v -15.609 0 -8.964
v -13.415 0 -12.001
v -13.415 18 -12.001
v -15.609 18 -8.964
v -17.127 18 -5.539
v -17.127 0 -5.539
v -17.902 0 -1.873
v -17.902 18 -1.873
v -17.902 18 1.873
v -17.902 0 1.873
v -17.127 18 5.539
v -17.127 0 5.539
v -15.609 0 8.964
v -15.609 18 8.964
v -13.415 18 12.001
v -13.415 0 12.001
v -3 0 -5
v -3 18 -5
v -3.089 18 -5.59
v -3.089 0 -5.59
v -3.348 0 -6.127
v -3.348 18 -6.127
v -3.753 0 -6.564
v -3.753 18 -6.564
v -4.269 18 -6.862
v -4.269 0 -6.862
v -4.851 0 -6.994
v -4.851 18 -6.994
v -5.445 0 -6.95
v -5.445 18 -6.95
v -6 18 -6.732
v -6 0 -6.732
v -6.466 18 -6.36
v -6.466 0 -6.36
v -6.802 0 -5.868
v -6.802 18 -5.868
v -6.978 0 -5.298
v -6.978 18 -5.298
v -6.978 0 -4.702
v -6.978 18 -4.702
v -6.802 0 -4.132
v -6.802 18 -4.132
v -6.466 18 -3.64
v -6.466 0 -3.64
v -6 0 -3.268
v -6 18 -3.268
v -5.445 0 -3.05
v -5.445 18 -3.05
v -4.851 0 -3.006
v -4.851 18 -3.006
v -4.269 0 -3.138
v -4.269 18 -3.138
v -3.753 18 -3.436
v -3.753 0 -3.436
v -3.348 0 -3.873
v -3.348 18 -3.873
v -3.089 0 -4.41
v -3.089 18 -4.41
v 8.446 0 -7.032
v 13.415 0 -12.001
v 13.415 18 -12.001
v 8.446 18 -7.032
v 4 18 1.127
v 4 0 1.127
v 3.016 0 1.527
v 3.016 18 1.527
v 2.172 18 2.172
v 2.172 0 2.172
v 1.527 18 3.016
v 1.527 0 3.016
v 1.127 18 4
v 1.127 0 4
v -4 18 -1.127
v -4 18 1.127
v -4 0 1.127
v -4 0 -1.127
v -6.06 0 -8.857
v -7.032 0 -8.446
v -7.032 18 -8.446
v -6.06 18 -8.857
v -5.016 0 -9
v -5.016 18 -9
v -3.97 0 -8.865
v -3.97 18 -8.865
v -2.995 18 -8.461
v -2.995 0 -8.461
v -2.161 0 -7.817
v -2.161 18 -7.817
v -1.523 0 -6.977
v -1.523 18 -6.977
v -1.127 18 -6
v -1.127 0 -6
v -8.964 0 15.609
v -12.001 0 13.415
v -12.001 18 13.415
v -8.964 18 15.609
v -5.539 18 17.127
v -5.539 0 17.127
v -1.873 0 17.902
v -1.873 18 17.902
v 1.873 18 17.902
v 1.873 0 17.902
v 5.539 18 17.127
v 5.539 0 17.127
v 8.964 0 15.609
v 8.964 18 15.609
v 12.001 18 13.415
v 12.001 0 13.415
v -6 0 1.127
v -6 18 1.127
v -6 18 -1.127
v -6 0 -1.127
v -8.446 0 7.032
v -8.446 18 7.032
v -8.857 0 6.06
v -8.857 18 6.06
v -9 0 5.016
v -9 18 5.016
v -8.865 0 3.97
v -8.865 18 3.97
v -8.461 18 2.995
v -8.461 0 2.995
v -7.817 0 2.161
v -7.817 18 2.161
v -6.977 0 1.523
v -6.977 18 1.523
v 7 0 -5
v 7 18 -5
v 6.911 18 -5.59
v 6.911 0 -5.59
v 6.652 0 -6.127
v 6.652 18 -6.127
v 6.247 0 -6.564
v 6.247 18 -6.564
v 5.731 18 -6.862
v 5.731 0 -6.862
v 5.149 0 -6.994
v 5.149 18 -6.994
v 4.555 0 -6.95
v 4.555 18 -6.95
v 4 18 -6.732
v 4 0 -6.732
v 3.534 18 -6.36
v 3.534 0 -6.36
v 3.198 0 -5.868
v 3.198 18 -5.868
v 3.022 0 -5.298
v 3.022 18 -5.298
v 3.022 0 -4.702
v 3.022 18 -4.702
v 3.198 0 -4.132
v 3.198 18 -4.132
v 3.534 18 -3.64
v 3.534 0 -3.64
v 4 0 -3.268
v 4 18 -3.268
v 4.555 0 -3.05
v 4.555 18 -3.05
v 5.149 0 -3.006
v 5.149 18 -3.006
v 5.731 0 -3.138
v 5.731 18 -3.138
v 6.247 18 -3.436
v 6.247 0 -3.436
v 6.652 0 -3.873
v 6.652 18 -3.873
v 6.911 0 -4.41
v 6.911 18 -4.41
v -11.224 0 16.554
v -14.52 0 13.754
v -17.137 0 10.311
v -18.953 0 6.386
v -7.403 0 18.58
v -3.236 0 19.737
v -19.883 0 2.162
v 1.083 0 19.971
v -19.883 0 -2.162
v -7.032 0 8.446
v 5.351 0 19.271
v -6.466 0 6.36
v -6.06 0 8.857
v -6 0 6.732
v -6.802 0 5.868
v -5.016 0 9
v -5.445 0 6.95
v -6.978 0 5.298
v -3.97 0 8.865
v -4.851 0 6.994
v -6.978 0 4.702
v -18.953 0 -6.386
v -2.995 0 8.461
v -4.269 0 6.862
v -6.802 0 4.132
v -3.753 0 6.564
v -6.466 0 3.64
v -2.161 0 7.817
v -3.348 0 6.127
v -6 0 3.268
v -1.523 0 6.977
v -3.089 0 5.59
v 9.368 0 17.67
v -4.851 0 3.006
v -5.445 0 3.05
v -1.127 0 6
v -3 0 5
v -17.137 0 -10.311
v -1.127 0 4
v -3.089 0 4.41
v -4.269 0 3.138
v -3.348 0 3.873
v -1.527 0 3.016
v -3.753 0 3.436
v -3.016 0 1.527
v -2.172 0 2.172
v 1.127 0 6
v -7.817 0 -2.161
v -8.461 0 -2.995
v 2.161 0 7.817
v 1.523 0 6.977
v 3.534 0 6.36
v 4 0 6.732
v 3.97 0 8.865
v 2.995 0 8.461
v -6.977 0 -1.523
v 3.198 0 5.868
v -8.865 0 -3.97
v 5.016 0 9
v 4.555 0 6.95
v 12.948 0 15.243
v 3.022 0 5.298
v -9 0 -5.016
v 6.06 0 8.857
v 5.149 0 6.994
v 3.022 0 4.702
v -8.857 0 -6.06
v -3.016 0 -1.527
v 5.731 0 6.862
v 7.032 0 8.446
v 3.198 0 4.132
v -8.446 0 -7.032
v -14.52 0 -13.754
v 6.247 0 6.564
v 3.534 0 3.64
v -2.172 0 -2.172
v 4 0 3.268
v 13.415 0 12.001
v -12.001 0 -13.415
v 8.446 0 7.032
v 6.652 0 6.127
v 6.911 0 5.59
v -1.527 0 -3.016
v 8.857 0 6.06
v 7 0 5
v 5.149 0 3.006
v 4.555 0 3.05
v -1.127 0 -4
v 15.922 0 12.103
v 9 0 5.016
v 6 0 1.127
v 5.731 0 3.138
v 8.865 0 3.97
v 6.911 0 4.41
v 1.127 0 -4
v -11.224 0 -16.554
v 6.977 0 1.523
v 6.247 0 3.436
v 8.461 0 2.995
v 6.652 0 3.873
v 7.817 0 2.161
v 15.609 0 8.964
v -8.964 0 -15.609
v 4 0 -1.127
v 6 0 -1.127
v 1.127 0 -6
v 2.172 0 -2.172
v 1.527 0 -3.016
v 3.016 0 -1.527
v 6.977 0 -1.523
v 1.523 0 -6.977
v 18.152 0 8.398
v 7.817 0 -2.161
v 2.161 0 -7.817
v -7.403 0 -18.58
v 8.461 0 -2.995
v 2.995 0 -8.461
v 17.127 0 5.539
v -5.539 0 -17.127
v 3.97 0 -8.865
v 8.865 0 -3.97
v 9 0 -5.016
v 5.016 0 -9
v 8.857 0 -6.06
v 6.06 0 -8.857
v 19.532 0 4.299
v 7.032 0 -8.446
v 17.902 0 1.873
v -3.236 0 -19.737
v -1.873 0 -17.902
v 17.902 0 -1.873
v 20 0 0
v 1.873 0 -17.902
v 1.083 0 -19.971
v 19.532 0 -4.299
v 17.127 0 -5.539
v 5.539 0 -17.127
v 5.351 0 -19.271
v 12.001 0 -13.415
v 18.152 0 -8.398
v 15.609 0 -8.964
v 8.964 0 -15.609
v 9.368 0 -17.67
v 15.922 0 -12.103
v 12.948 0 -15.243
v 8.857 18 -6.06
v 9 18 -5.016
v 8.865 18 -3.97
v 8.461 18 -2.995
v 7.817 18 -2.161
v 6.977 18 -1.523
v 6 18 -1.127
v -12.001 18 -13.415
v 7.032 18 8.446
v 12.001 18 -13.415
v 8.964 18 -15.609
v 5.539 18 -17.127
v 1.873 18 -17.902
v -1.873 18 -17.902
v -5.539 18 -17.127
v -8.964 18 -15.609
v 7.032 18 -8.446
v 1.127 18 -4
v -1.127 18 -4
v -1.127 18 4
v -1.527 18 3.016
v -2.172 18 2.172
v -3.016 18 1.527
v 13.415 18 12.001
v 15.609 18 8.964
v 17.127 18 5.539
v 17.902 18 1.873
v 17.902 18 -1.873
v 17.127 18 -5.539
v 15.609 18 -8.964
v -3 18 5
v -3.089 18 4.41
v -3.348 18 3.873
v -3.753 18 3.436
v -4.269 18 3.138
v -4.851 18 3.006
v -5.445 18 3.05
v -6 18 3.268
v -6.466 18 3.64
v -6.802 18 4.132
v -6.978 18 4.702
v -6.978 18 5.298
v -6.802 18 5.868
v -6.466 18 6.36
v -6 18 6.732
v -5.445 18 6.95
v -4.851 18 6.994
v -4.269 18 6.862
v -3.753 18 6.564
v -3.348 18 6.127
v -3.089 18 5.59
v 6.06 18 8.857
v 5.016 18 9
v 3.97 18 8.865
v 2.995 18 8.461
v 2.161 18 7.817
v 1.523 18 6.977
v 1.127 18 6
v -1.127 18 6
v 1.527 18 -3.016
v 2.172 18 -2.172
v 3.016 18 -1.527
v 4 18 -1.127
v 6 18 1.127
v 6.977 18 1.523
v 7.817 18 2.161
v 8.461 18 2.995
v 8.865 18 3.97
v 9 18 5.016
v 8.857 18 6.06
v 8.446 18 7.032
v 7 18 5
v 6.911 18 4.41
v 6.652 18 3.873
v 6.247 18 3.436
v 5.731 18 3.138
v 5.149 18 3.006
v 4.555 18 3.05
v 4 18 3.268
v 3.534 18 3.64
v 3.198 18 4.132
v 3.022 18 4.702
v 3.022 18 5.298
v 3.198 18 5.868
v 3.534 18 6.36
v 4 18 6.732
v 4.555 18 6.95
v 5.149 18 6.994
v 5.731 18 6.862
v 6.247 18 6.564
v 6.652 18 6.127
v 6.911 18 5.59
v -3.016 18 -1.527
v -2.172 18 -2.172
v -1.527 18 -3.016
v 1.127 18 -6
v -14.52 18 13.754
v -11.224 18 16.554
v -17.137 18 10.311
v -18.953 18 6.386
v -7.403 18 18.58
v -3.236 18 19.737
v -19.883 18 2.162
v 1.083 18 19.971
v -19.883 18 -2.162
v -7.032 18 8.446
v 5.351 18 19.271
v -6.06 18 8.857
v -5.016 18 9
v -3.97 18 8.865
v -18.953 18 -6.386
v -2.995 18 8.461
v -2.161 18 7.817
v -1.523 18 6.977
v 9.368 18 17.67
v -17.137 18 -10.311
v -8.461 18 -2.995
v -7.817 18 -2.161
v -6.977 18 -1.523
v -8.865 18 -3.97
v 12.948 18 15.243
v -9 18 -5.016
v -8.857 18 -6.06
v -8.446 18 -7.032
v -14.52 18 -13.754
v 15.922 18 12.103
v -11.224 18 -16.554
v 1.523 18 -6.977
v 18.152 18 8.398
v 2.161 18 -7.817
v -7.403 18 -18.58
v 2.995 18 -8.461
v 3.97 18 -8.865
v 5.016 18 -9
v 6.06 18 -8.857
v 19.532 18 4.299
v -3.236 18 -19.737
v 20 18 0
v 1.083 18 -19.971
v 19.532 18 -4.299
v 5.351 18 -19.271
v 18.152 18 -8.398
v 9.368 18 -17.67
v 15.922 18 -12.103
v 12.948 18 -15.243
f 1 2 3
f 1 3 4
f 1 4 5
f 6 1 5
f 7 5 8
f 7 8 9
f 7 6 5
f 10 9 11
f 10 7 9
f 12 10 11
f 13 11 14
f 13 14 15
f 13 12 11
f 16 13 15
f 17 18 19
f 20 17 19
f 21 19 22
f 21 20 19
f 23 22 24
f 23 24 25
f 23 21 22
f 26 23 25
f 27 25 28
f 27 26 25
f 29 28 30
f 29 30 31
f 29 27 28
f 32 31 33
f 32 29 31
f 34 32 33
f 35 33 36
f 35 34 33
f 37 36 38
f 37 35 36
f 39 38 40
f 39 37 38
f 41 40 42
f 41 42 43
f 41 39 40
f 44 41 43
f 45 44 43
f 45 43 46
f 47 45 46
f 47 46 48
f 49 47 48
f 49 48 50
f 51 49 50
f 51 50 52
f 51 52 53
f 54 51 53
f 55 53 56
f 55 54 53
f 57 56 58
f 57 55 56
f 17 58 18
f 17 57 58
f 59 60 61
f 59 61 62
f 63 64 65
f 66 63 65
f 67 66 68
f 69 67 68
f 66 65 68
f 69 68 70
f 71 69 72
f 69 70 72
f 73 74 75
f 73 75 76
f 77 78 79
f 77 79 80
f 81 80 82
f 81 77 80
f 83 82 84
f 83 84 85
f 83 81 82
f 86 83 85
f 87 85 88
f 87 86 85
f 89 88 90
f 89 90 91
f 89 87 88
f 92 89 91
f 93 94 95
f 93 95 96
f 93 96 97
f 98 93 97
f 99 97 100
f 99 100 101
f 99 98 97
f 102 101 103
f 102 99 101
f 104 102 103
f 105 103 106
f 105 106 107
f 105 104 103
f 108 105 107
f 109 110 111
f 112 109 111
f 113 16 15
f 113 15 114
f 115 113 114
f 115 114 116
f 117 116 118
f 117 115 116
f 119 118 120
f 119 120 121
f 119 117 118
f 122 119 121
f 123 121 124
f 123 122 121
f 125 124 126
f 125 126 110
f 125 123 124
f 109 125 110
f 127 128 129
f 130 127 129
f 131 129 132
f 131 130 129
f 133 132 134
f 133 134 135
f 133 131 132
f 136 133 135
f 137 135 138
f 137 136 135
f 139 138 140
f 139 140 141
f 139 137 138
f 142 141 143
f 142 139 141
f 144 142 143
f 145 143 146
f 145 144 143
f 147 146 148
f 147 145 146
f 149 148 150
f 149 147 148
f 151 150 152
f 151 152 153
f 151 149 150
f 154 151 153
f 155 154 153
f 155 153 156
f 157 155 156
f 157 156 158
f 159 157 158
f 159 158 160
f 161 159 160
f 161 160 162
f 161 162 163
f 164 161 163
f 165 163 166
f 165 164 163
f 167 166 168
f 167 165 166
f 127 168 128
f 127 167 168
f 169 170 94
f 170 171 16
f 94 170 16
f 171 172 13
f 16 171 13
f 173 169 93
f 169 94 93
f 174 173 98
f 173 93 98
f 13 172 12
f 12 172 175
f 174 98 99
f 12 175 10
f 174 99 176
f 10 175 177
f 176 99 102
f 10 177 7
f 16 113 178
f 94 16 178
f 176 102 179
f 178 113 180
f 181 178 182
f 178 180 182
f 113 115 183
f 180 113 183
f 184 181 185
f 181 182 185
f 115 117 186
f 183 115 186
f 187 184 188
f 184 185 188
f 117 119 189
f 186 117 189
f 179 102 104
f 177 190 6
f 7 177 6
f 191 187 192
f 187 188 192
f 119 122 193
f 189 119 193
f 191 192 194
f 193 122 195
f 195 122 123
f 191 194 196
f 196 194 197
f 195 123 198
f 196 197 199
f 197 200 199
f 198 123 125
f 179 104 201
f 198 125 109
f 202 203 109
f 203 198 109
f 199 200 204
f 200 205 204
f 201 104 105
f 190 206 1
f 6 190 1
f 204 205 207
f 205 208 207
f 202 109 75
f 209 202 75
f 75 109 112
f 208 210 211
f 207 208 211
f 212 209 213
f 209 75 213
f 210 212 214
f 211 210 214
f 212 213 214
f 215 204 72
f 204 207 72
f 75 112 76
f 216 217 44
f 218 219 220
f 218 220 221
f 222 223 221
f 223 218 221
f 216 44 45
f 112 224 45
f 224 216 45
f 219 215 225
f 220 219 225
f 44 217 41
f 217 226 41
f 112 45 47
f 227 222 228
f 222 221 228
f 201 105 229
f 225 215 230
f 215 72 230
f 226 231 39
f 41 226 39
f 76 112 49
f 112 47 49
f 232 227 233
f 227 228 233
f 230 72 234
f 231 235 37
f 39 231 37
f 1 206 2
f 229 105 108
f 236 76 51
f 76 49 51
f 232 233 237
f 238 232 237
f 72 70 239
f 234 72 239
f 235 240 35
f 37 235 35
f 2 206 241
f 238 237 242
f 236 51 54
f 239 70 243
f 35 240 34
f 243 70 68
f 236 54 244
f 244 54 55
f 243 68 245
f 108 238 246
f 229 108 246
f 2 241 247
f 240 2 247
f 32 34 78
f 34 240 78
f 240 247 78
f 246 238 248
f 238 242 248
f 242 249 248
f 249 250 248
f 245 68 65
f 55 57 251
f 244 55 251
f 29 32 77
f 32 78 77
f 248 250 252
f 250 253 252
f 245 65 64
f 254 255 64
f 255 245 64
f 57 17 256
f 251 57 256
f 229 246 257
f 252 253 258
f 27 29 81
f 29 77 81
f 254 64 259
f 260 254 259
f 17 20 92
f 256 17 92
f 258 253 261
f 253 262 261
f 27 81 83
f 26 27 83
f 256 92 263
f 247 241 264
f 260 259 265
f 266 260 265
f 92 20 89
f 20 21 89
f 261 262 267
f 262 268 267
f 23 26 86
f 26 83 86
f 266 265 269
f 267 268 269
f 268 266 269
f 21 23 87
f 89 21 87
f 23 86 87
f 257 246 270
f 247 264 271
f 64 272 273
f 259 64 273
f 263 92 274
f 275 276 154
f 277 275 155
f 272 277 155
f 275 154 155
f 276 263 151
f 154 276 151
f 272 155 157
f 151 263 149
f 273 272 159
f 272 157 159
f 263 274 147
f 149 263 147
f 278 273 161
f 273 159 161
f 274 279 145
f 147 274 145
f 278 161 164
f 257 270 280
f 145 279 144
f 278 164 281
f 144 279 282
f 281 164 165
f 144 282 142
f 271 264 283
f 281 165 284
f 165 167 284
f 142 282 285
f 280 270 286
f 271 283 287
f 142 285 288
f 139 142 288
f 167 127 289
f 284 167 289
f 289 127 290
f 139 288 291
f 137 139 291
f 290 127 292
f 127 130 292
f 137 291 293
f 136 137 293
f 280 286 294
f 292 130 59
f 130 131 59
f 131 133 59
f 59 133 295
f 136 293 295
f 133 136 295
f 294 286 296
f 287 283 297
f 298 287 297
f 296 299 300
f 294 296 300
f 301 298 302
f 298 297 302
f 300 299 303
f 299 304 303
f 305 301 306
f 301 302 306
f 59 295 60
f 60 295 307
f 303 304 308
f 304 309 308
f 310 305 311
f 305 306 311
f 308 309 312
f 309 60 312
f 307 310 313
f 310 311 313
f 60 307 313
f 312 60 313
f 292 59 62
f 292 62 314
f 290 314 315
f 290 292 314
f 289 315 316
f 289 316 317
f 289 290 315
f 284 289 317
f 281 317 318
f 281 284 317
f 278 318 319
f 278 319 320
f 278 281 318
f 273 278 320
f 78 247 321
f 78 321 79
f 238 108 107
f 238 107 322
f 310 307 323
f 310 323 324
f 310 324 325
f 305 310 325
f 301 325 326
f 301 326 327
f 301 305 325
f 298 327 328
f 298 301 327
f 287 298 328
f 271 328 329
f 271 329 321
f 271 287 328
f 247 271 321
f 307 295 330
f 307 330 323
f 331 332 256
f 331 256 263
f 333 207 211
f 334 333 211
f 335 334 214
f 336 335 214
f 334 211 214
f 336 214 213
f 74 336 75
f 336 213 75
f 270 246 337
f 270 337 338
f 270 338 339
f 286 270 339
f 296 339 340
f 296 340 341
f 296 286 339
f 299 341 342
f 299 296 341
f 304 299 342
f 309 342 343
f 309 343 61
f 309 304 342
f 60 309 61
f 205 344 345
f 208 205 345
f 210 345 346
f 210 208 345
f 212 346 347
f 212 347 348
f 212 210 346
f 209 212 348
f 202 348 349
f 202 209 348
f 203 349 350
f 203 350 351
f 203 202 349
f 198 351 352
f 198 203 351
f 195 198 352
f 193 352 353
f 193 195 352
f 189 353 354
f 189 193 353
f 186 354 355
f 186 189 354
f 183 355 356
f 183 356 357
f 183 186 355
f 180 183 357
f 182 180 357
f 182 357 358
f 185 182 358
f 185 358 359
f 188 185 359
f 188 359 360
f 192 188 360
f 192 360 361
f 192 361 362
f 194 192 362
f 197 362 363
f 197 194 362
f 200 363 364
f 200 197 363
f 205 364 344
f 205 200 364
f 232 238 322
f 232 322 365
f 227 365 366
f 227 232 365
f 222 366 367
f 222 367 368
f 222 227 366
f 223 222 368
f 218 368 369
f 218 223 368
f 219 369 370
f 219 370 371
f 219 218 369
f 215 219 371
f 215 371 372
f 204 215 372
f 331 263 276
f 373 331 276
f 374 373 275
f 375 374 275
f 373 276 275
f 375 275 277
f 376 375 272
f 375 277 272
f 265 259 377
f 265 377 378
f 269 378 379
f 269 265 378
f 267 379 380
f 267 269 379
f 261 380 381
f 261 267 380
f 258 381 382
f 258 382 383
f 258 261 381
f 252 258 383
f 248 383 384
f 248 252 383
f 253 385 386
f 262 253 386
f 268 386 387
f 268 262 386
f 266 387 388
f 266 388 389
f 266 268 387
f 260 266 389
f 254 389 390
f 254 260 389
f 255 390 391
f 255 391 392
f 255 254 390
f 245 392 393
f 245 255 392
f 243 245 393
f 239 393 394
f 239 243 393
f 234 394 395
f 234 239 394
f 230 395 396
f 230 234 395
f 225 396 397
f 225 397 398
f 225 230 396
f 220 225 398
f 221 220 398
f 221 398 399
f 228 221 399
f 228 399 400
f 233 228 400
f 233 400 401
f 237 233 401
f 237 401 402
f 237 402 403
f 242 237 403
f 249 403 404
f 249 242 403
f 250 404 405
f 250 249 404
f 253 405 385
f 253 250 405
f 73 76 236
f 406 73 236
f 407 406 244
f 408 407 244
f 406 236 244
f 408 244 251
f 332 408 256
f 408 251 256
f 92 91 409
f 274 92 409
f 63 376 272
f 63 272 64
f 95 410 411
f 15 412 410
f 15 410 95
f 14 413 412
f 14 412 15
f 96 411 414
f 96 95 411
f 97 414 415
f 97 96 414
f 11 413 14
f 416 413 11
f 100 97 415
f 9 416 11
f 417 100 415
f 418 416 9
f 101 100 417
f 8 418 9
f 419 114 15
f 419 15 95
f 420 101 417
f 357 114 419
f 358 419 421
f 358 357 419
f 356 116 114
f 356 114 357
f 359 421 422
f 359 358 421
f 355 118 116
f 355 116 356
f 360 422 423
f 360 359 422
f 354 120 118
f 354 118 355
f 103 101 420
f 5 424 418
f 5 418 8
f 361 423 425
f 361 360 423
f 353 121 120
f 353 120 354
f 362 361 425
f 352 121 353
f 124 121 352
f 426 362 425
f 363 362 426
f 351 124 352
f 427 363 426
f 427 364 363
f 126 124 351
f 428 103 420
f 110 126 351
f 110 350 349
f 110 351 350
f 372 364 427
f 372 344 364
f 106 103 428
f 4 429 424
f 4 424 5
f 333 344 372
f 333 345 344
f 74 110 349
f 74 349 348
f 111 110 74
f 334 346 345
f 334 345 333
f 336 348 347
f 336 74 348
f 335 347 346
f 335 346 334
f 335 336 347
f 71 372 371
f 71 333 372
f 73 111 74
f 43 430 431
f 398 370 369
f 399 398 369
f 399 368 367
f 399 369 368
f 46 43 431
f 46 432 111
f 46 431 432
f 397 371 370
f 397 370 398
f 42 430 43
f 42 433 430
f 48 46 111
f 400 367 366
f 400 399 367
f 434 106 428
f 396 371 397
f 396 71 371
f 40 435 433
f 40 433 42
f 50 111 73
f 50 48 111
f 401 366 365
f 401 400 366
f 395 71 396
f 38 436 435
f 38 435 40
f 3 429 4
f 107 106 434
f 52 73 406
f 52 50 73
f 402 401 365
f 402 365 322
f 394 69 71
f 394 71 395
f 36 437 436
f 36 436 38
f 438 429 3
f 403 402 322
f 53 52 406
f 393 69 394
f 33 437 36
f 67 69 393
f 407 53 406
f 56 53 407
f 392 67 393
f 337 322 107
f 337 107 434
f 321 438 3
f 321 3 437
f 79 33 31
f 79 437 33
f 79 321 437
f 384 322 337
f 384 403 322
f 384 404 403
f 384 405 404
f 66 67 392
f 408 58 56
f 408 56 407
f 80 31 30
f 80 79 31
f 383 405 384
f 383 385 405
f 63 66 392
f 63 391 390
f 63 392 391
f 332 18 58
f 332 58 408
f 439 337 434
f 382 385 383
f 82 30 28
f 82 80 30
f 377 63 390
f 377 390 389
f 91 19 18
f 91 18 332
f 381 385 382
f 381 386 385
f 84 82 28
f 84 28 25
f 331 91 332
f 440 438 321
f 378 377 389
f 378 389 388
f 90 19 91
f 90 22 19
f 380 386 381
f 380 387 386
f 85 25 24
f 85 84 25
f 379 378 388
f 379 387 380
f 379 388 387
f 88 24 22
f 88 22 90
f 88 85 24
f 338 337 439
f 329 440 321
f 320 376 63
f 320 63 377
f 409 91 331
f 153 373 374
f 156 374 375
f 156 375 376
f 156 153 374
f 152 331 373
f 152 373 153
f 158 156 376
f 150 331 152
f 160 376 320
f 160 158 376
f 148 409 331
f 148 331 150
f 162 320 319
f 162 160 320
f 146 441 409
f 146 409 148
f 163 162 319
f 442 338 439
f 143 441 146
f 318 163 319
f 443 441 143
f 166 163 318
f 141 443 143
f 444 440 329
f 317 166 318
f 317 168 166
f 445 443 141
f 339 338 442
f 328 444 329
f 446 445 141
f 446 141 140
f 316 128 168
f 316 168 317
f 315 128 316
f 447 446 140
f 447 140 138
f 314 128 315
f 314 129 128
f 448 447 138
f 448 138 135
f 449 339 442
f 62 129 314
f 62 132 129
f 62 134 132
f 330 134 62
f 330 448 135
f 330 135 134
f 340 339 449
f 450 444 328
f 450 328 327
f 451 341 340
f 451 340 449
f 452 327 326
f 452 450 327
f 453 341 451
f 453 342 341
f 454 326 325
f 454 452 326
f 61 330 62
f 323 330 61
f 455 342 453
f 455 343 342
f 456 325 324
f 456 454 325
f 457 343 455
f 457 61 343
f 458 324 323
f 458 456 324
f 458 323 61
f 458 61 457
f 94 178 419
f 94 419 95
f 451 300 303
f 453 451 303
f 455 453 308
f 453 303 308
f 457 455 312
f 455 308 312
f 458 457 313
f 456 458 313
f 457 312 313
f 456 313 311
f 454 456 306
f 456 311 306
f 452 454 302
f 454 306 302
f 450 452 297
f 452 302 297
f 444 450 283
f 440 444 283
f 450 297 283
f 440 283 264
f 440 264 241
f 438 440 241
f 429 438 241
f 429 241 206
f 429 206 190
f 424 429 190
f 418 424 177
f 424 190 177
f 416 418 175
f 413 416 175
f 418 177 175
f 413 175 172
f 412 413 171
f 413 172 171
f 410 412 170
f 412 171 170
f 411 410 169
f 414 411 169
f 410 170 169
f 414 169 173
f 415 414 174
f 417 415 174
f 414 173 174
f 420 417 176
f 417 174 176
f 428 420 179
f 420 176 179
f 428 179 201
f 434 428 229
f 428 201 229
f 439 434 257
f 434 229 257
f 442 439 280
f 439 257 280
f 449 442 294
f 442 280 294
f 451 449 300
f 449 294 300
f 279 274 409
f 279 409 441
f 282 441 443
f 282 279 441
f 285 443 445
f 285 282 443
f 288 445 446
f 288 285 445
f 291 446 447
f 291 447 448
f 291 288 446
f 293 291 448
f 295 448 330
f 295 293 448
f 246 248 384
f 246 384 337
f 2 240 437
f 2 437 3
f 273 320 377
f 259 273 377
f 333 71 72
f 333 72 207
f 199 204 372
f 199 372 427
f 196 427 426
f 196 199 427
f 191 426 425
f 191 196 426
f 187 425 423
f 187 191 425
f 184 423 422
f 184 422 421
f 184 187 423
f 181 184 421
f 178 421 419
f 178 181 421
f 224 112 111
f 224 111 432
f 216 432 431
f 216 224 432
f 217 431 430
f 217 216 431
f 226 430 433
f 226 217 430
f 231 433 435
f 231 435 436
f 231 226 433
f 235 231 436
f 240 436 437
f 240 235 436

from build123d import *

# Parameters (mm, degrees)
SKETCH_2_R      = 20
SKETCH_2_R_2    = 2
EXTRUDE_1_DEPTH = 18


with BuildPart() as part:
    # 草图2 → 凸台-拉伸1 (new body)
    with BuildSketch(Plane(origin=(0, 0, 0), x_dir=(1, 0, 0), z_dir=(0, 1, 0))):
        Circle(SKETCH_2_R)
        with Locations((-5, 5)):
            Circle(SKETCH_2_R_2, mode=Mode.SUBTRACT)
        with Locations((5, 5)):
            Circle(SKETCH_2_R_2, mode=Mode.SUBTRACT)
        with Locations((5, -5)):
            Circle(SKETCH_2_R_2, mode=Mode.SUBTRACT)
        with Locations((-5, -5)):
            Circle(SKETCH_2_R_2, mode=Mode.SUBTRACT)
        with BuildLine():
            Line((-8.445719569, 7.031506006), (-13.415371808, 12.001158246))
            ThreePointArc((-13.415371808, 12.001158246), (-18, 0), (-13.415371808, -12.001158246))
            Line((-13.415371808, -12.001158246), (-8.445719569, -7.031506006))
            ThreePointArc((-8.445719569, -7.031506006), (-8.69551813, -3.469266271), (-6, -1.127016654))
            Line((-6, -1.127016654), (-6, 1.127016654))
            ThreePointArc((-6, 1.127016654), (-8.69551813, 3.469266271), (-8.445719569, 7.031506006))
        make_face(mode=Mode.SUBTRACT)
        with BuildLine():
            Line((-12.001158246, 13.415371808), (-7.031506006, 8.445719569))
            ThreePointArc((-7.031506006, 8.445719569), (-3.469266271, 8.69551813), (-1.127016654, 6))
            Line((-1.127016654, 6), (1.127016654, 6))
            ThreePointArc((1.127016654, 6), (3.469266271, 8.69551813), (7.031506006, 8.445719569))
            Line((7.031506006, 8.445719569), (12.001158246, 13.415371808))
            ThreePointArc((12.001158246, 13.415371808), (0, 18), (-12.001158246, 13.415371808))
        make_face(mode=Mode.SUBTRACT)
        with BuildLine():
            Line((13.415371808, 12.001158246), (8.445719569, 7.031506006))
            ThreePointArc((8.445719569, 7.031506006), (8.69551813, 3.469266271), (6, 1.127016654))
            Line((6, 1.127016654), (6, -1.127016654))
            ThreePointArc((6, -1.127016654), (8.69551813, -3.469266271), (8.445719569, -7.031506006))
            Line((8.445719569, -7.031506006), (13.415371808, -12.001158246))
            ThreePointArc((13.415371808, -12.001158246), (18, 0), (13.415371808, 12.001158246))
        make_face(mode=Mode.SUBTRACT)
        with BuildLine():
            Line((12.001158246, -13.415371808), (7.031506006, -8.445719569))
            ThreePointArc((7.031506006, -8.445719569), (3.469266271, -8.69551813), (1.127016654, -6))
            Line((1.127016654, -6), (-1.127016654, -6))
            ThreePointArc((-1.127016654, -6), (-3.469266271, -8.69551813), (-7.031506006, -8.445719569))
            Line((-7.031506006, -8.445719569), (-12.001158246, -13.415371808))
            ThreePointArc((-12.001158246, -13.415371808), (0, -18), (12.001158246, -13.415371808))
        make_face(mode=Mode.SUBTRACT)
        with BuildLine():
            Line((-1.127016654, 4), (1.127016654, 4))
            ThreePointArc((1.127016654, 4), (2.171572875, 2.171572875), (4, 1.127016654))
            Line((4, 1.127016654), (4, -1.127016654))
            ThreePointArc((4, -1.127016654), (2.171572875, -2.171572875), (1.127016654, -4))
            Line((1.127016654, -4), (-1.127016654, -4))
            ThreePointArc((-1.127016654, -4), (-2.171572875, -2.171572875), (-4, -1.127016654))
            Line((-4, -1.127016654), (-4, 1.127016654))
            ThreePointArc((-4, 1.127016654), (-2.171572875, 2.171572875), (-1.127016654, 4))
        make_face(mode=Mode.SUBTRACT)
    extrude(amount=EXTRUDE_1_DEPTH)


solid = part.part
